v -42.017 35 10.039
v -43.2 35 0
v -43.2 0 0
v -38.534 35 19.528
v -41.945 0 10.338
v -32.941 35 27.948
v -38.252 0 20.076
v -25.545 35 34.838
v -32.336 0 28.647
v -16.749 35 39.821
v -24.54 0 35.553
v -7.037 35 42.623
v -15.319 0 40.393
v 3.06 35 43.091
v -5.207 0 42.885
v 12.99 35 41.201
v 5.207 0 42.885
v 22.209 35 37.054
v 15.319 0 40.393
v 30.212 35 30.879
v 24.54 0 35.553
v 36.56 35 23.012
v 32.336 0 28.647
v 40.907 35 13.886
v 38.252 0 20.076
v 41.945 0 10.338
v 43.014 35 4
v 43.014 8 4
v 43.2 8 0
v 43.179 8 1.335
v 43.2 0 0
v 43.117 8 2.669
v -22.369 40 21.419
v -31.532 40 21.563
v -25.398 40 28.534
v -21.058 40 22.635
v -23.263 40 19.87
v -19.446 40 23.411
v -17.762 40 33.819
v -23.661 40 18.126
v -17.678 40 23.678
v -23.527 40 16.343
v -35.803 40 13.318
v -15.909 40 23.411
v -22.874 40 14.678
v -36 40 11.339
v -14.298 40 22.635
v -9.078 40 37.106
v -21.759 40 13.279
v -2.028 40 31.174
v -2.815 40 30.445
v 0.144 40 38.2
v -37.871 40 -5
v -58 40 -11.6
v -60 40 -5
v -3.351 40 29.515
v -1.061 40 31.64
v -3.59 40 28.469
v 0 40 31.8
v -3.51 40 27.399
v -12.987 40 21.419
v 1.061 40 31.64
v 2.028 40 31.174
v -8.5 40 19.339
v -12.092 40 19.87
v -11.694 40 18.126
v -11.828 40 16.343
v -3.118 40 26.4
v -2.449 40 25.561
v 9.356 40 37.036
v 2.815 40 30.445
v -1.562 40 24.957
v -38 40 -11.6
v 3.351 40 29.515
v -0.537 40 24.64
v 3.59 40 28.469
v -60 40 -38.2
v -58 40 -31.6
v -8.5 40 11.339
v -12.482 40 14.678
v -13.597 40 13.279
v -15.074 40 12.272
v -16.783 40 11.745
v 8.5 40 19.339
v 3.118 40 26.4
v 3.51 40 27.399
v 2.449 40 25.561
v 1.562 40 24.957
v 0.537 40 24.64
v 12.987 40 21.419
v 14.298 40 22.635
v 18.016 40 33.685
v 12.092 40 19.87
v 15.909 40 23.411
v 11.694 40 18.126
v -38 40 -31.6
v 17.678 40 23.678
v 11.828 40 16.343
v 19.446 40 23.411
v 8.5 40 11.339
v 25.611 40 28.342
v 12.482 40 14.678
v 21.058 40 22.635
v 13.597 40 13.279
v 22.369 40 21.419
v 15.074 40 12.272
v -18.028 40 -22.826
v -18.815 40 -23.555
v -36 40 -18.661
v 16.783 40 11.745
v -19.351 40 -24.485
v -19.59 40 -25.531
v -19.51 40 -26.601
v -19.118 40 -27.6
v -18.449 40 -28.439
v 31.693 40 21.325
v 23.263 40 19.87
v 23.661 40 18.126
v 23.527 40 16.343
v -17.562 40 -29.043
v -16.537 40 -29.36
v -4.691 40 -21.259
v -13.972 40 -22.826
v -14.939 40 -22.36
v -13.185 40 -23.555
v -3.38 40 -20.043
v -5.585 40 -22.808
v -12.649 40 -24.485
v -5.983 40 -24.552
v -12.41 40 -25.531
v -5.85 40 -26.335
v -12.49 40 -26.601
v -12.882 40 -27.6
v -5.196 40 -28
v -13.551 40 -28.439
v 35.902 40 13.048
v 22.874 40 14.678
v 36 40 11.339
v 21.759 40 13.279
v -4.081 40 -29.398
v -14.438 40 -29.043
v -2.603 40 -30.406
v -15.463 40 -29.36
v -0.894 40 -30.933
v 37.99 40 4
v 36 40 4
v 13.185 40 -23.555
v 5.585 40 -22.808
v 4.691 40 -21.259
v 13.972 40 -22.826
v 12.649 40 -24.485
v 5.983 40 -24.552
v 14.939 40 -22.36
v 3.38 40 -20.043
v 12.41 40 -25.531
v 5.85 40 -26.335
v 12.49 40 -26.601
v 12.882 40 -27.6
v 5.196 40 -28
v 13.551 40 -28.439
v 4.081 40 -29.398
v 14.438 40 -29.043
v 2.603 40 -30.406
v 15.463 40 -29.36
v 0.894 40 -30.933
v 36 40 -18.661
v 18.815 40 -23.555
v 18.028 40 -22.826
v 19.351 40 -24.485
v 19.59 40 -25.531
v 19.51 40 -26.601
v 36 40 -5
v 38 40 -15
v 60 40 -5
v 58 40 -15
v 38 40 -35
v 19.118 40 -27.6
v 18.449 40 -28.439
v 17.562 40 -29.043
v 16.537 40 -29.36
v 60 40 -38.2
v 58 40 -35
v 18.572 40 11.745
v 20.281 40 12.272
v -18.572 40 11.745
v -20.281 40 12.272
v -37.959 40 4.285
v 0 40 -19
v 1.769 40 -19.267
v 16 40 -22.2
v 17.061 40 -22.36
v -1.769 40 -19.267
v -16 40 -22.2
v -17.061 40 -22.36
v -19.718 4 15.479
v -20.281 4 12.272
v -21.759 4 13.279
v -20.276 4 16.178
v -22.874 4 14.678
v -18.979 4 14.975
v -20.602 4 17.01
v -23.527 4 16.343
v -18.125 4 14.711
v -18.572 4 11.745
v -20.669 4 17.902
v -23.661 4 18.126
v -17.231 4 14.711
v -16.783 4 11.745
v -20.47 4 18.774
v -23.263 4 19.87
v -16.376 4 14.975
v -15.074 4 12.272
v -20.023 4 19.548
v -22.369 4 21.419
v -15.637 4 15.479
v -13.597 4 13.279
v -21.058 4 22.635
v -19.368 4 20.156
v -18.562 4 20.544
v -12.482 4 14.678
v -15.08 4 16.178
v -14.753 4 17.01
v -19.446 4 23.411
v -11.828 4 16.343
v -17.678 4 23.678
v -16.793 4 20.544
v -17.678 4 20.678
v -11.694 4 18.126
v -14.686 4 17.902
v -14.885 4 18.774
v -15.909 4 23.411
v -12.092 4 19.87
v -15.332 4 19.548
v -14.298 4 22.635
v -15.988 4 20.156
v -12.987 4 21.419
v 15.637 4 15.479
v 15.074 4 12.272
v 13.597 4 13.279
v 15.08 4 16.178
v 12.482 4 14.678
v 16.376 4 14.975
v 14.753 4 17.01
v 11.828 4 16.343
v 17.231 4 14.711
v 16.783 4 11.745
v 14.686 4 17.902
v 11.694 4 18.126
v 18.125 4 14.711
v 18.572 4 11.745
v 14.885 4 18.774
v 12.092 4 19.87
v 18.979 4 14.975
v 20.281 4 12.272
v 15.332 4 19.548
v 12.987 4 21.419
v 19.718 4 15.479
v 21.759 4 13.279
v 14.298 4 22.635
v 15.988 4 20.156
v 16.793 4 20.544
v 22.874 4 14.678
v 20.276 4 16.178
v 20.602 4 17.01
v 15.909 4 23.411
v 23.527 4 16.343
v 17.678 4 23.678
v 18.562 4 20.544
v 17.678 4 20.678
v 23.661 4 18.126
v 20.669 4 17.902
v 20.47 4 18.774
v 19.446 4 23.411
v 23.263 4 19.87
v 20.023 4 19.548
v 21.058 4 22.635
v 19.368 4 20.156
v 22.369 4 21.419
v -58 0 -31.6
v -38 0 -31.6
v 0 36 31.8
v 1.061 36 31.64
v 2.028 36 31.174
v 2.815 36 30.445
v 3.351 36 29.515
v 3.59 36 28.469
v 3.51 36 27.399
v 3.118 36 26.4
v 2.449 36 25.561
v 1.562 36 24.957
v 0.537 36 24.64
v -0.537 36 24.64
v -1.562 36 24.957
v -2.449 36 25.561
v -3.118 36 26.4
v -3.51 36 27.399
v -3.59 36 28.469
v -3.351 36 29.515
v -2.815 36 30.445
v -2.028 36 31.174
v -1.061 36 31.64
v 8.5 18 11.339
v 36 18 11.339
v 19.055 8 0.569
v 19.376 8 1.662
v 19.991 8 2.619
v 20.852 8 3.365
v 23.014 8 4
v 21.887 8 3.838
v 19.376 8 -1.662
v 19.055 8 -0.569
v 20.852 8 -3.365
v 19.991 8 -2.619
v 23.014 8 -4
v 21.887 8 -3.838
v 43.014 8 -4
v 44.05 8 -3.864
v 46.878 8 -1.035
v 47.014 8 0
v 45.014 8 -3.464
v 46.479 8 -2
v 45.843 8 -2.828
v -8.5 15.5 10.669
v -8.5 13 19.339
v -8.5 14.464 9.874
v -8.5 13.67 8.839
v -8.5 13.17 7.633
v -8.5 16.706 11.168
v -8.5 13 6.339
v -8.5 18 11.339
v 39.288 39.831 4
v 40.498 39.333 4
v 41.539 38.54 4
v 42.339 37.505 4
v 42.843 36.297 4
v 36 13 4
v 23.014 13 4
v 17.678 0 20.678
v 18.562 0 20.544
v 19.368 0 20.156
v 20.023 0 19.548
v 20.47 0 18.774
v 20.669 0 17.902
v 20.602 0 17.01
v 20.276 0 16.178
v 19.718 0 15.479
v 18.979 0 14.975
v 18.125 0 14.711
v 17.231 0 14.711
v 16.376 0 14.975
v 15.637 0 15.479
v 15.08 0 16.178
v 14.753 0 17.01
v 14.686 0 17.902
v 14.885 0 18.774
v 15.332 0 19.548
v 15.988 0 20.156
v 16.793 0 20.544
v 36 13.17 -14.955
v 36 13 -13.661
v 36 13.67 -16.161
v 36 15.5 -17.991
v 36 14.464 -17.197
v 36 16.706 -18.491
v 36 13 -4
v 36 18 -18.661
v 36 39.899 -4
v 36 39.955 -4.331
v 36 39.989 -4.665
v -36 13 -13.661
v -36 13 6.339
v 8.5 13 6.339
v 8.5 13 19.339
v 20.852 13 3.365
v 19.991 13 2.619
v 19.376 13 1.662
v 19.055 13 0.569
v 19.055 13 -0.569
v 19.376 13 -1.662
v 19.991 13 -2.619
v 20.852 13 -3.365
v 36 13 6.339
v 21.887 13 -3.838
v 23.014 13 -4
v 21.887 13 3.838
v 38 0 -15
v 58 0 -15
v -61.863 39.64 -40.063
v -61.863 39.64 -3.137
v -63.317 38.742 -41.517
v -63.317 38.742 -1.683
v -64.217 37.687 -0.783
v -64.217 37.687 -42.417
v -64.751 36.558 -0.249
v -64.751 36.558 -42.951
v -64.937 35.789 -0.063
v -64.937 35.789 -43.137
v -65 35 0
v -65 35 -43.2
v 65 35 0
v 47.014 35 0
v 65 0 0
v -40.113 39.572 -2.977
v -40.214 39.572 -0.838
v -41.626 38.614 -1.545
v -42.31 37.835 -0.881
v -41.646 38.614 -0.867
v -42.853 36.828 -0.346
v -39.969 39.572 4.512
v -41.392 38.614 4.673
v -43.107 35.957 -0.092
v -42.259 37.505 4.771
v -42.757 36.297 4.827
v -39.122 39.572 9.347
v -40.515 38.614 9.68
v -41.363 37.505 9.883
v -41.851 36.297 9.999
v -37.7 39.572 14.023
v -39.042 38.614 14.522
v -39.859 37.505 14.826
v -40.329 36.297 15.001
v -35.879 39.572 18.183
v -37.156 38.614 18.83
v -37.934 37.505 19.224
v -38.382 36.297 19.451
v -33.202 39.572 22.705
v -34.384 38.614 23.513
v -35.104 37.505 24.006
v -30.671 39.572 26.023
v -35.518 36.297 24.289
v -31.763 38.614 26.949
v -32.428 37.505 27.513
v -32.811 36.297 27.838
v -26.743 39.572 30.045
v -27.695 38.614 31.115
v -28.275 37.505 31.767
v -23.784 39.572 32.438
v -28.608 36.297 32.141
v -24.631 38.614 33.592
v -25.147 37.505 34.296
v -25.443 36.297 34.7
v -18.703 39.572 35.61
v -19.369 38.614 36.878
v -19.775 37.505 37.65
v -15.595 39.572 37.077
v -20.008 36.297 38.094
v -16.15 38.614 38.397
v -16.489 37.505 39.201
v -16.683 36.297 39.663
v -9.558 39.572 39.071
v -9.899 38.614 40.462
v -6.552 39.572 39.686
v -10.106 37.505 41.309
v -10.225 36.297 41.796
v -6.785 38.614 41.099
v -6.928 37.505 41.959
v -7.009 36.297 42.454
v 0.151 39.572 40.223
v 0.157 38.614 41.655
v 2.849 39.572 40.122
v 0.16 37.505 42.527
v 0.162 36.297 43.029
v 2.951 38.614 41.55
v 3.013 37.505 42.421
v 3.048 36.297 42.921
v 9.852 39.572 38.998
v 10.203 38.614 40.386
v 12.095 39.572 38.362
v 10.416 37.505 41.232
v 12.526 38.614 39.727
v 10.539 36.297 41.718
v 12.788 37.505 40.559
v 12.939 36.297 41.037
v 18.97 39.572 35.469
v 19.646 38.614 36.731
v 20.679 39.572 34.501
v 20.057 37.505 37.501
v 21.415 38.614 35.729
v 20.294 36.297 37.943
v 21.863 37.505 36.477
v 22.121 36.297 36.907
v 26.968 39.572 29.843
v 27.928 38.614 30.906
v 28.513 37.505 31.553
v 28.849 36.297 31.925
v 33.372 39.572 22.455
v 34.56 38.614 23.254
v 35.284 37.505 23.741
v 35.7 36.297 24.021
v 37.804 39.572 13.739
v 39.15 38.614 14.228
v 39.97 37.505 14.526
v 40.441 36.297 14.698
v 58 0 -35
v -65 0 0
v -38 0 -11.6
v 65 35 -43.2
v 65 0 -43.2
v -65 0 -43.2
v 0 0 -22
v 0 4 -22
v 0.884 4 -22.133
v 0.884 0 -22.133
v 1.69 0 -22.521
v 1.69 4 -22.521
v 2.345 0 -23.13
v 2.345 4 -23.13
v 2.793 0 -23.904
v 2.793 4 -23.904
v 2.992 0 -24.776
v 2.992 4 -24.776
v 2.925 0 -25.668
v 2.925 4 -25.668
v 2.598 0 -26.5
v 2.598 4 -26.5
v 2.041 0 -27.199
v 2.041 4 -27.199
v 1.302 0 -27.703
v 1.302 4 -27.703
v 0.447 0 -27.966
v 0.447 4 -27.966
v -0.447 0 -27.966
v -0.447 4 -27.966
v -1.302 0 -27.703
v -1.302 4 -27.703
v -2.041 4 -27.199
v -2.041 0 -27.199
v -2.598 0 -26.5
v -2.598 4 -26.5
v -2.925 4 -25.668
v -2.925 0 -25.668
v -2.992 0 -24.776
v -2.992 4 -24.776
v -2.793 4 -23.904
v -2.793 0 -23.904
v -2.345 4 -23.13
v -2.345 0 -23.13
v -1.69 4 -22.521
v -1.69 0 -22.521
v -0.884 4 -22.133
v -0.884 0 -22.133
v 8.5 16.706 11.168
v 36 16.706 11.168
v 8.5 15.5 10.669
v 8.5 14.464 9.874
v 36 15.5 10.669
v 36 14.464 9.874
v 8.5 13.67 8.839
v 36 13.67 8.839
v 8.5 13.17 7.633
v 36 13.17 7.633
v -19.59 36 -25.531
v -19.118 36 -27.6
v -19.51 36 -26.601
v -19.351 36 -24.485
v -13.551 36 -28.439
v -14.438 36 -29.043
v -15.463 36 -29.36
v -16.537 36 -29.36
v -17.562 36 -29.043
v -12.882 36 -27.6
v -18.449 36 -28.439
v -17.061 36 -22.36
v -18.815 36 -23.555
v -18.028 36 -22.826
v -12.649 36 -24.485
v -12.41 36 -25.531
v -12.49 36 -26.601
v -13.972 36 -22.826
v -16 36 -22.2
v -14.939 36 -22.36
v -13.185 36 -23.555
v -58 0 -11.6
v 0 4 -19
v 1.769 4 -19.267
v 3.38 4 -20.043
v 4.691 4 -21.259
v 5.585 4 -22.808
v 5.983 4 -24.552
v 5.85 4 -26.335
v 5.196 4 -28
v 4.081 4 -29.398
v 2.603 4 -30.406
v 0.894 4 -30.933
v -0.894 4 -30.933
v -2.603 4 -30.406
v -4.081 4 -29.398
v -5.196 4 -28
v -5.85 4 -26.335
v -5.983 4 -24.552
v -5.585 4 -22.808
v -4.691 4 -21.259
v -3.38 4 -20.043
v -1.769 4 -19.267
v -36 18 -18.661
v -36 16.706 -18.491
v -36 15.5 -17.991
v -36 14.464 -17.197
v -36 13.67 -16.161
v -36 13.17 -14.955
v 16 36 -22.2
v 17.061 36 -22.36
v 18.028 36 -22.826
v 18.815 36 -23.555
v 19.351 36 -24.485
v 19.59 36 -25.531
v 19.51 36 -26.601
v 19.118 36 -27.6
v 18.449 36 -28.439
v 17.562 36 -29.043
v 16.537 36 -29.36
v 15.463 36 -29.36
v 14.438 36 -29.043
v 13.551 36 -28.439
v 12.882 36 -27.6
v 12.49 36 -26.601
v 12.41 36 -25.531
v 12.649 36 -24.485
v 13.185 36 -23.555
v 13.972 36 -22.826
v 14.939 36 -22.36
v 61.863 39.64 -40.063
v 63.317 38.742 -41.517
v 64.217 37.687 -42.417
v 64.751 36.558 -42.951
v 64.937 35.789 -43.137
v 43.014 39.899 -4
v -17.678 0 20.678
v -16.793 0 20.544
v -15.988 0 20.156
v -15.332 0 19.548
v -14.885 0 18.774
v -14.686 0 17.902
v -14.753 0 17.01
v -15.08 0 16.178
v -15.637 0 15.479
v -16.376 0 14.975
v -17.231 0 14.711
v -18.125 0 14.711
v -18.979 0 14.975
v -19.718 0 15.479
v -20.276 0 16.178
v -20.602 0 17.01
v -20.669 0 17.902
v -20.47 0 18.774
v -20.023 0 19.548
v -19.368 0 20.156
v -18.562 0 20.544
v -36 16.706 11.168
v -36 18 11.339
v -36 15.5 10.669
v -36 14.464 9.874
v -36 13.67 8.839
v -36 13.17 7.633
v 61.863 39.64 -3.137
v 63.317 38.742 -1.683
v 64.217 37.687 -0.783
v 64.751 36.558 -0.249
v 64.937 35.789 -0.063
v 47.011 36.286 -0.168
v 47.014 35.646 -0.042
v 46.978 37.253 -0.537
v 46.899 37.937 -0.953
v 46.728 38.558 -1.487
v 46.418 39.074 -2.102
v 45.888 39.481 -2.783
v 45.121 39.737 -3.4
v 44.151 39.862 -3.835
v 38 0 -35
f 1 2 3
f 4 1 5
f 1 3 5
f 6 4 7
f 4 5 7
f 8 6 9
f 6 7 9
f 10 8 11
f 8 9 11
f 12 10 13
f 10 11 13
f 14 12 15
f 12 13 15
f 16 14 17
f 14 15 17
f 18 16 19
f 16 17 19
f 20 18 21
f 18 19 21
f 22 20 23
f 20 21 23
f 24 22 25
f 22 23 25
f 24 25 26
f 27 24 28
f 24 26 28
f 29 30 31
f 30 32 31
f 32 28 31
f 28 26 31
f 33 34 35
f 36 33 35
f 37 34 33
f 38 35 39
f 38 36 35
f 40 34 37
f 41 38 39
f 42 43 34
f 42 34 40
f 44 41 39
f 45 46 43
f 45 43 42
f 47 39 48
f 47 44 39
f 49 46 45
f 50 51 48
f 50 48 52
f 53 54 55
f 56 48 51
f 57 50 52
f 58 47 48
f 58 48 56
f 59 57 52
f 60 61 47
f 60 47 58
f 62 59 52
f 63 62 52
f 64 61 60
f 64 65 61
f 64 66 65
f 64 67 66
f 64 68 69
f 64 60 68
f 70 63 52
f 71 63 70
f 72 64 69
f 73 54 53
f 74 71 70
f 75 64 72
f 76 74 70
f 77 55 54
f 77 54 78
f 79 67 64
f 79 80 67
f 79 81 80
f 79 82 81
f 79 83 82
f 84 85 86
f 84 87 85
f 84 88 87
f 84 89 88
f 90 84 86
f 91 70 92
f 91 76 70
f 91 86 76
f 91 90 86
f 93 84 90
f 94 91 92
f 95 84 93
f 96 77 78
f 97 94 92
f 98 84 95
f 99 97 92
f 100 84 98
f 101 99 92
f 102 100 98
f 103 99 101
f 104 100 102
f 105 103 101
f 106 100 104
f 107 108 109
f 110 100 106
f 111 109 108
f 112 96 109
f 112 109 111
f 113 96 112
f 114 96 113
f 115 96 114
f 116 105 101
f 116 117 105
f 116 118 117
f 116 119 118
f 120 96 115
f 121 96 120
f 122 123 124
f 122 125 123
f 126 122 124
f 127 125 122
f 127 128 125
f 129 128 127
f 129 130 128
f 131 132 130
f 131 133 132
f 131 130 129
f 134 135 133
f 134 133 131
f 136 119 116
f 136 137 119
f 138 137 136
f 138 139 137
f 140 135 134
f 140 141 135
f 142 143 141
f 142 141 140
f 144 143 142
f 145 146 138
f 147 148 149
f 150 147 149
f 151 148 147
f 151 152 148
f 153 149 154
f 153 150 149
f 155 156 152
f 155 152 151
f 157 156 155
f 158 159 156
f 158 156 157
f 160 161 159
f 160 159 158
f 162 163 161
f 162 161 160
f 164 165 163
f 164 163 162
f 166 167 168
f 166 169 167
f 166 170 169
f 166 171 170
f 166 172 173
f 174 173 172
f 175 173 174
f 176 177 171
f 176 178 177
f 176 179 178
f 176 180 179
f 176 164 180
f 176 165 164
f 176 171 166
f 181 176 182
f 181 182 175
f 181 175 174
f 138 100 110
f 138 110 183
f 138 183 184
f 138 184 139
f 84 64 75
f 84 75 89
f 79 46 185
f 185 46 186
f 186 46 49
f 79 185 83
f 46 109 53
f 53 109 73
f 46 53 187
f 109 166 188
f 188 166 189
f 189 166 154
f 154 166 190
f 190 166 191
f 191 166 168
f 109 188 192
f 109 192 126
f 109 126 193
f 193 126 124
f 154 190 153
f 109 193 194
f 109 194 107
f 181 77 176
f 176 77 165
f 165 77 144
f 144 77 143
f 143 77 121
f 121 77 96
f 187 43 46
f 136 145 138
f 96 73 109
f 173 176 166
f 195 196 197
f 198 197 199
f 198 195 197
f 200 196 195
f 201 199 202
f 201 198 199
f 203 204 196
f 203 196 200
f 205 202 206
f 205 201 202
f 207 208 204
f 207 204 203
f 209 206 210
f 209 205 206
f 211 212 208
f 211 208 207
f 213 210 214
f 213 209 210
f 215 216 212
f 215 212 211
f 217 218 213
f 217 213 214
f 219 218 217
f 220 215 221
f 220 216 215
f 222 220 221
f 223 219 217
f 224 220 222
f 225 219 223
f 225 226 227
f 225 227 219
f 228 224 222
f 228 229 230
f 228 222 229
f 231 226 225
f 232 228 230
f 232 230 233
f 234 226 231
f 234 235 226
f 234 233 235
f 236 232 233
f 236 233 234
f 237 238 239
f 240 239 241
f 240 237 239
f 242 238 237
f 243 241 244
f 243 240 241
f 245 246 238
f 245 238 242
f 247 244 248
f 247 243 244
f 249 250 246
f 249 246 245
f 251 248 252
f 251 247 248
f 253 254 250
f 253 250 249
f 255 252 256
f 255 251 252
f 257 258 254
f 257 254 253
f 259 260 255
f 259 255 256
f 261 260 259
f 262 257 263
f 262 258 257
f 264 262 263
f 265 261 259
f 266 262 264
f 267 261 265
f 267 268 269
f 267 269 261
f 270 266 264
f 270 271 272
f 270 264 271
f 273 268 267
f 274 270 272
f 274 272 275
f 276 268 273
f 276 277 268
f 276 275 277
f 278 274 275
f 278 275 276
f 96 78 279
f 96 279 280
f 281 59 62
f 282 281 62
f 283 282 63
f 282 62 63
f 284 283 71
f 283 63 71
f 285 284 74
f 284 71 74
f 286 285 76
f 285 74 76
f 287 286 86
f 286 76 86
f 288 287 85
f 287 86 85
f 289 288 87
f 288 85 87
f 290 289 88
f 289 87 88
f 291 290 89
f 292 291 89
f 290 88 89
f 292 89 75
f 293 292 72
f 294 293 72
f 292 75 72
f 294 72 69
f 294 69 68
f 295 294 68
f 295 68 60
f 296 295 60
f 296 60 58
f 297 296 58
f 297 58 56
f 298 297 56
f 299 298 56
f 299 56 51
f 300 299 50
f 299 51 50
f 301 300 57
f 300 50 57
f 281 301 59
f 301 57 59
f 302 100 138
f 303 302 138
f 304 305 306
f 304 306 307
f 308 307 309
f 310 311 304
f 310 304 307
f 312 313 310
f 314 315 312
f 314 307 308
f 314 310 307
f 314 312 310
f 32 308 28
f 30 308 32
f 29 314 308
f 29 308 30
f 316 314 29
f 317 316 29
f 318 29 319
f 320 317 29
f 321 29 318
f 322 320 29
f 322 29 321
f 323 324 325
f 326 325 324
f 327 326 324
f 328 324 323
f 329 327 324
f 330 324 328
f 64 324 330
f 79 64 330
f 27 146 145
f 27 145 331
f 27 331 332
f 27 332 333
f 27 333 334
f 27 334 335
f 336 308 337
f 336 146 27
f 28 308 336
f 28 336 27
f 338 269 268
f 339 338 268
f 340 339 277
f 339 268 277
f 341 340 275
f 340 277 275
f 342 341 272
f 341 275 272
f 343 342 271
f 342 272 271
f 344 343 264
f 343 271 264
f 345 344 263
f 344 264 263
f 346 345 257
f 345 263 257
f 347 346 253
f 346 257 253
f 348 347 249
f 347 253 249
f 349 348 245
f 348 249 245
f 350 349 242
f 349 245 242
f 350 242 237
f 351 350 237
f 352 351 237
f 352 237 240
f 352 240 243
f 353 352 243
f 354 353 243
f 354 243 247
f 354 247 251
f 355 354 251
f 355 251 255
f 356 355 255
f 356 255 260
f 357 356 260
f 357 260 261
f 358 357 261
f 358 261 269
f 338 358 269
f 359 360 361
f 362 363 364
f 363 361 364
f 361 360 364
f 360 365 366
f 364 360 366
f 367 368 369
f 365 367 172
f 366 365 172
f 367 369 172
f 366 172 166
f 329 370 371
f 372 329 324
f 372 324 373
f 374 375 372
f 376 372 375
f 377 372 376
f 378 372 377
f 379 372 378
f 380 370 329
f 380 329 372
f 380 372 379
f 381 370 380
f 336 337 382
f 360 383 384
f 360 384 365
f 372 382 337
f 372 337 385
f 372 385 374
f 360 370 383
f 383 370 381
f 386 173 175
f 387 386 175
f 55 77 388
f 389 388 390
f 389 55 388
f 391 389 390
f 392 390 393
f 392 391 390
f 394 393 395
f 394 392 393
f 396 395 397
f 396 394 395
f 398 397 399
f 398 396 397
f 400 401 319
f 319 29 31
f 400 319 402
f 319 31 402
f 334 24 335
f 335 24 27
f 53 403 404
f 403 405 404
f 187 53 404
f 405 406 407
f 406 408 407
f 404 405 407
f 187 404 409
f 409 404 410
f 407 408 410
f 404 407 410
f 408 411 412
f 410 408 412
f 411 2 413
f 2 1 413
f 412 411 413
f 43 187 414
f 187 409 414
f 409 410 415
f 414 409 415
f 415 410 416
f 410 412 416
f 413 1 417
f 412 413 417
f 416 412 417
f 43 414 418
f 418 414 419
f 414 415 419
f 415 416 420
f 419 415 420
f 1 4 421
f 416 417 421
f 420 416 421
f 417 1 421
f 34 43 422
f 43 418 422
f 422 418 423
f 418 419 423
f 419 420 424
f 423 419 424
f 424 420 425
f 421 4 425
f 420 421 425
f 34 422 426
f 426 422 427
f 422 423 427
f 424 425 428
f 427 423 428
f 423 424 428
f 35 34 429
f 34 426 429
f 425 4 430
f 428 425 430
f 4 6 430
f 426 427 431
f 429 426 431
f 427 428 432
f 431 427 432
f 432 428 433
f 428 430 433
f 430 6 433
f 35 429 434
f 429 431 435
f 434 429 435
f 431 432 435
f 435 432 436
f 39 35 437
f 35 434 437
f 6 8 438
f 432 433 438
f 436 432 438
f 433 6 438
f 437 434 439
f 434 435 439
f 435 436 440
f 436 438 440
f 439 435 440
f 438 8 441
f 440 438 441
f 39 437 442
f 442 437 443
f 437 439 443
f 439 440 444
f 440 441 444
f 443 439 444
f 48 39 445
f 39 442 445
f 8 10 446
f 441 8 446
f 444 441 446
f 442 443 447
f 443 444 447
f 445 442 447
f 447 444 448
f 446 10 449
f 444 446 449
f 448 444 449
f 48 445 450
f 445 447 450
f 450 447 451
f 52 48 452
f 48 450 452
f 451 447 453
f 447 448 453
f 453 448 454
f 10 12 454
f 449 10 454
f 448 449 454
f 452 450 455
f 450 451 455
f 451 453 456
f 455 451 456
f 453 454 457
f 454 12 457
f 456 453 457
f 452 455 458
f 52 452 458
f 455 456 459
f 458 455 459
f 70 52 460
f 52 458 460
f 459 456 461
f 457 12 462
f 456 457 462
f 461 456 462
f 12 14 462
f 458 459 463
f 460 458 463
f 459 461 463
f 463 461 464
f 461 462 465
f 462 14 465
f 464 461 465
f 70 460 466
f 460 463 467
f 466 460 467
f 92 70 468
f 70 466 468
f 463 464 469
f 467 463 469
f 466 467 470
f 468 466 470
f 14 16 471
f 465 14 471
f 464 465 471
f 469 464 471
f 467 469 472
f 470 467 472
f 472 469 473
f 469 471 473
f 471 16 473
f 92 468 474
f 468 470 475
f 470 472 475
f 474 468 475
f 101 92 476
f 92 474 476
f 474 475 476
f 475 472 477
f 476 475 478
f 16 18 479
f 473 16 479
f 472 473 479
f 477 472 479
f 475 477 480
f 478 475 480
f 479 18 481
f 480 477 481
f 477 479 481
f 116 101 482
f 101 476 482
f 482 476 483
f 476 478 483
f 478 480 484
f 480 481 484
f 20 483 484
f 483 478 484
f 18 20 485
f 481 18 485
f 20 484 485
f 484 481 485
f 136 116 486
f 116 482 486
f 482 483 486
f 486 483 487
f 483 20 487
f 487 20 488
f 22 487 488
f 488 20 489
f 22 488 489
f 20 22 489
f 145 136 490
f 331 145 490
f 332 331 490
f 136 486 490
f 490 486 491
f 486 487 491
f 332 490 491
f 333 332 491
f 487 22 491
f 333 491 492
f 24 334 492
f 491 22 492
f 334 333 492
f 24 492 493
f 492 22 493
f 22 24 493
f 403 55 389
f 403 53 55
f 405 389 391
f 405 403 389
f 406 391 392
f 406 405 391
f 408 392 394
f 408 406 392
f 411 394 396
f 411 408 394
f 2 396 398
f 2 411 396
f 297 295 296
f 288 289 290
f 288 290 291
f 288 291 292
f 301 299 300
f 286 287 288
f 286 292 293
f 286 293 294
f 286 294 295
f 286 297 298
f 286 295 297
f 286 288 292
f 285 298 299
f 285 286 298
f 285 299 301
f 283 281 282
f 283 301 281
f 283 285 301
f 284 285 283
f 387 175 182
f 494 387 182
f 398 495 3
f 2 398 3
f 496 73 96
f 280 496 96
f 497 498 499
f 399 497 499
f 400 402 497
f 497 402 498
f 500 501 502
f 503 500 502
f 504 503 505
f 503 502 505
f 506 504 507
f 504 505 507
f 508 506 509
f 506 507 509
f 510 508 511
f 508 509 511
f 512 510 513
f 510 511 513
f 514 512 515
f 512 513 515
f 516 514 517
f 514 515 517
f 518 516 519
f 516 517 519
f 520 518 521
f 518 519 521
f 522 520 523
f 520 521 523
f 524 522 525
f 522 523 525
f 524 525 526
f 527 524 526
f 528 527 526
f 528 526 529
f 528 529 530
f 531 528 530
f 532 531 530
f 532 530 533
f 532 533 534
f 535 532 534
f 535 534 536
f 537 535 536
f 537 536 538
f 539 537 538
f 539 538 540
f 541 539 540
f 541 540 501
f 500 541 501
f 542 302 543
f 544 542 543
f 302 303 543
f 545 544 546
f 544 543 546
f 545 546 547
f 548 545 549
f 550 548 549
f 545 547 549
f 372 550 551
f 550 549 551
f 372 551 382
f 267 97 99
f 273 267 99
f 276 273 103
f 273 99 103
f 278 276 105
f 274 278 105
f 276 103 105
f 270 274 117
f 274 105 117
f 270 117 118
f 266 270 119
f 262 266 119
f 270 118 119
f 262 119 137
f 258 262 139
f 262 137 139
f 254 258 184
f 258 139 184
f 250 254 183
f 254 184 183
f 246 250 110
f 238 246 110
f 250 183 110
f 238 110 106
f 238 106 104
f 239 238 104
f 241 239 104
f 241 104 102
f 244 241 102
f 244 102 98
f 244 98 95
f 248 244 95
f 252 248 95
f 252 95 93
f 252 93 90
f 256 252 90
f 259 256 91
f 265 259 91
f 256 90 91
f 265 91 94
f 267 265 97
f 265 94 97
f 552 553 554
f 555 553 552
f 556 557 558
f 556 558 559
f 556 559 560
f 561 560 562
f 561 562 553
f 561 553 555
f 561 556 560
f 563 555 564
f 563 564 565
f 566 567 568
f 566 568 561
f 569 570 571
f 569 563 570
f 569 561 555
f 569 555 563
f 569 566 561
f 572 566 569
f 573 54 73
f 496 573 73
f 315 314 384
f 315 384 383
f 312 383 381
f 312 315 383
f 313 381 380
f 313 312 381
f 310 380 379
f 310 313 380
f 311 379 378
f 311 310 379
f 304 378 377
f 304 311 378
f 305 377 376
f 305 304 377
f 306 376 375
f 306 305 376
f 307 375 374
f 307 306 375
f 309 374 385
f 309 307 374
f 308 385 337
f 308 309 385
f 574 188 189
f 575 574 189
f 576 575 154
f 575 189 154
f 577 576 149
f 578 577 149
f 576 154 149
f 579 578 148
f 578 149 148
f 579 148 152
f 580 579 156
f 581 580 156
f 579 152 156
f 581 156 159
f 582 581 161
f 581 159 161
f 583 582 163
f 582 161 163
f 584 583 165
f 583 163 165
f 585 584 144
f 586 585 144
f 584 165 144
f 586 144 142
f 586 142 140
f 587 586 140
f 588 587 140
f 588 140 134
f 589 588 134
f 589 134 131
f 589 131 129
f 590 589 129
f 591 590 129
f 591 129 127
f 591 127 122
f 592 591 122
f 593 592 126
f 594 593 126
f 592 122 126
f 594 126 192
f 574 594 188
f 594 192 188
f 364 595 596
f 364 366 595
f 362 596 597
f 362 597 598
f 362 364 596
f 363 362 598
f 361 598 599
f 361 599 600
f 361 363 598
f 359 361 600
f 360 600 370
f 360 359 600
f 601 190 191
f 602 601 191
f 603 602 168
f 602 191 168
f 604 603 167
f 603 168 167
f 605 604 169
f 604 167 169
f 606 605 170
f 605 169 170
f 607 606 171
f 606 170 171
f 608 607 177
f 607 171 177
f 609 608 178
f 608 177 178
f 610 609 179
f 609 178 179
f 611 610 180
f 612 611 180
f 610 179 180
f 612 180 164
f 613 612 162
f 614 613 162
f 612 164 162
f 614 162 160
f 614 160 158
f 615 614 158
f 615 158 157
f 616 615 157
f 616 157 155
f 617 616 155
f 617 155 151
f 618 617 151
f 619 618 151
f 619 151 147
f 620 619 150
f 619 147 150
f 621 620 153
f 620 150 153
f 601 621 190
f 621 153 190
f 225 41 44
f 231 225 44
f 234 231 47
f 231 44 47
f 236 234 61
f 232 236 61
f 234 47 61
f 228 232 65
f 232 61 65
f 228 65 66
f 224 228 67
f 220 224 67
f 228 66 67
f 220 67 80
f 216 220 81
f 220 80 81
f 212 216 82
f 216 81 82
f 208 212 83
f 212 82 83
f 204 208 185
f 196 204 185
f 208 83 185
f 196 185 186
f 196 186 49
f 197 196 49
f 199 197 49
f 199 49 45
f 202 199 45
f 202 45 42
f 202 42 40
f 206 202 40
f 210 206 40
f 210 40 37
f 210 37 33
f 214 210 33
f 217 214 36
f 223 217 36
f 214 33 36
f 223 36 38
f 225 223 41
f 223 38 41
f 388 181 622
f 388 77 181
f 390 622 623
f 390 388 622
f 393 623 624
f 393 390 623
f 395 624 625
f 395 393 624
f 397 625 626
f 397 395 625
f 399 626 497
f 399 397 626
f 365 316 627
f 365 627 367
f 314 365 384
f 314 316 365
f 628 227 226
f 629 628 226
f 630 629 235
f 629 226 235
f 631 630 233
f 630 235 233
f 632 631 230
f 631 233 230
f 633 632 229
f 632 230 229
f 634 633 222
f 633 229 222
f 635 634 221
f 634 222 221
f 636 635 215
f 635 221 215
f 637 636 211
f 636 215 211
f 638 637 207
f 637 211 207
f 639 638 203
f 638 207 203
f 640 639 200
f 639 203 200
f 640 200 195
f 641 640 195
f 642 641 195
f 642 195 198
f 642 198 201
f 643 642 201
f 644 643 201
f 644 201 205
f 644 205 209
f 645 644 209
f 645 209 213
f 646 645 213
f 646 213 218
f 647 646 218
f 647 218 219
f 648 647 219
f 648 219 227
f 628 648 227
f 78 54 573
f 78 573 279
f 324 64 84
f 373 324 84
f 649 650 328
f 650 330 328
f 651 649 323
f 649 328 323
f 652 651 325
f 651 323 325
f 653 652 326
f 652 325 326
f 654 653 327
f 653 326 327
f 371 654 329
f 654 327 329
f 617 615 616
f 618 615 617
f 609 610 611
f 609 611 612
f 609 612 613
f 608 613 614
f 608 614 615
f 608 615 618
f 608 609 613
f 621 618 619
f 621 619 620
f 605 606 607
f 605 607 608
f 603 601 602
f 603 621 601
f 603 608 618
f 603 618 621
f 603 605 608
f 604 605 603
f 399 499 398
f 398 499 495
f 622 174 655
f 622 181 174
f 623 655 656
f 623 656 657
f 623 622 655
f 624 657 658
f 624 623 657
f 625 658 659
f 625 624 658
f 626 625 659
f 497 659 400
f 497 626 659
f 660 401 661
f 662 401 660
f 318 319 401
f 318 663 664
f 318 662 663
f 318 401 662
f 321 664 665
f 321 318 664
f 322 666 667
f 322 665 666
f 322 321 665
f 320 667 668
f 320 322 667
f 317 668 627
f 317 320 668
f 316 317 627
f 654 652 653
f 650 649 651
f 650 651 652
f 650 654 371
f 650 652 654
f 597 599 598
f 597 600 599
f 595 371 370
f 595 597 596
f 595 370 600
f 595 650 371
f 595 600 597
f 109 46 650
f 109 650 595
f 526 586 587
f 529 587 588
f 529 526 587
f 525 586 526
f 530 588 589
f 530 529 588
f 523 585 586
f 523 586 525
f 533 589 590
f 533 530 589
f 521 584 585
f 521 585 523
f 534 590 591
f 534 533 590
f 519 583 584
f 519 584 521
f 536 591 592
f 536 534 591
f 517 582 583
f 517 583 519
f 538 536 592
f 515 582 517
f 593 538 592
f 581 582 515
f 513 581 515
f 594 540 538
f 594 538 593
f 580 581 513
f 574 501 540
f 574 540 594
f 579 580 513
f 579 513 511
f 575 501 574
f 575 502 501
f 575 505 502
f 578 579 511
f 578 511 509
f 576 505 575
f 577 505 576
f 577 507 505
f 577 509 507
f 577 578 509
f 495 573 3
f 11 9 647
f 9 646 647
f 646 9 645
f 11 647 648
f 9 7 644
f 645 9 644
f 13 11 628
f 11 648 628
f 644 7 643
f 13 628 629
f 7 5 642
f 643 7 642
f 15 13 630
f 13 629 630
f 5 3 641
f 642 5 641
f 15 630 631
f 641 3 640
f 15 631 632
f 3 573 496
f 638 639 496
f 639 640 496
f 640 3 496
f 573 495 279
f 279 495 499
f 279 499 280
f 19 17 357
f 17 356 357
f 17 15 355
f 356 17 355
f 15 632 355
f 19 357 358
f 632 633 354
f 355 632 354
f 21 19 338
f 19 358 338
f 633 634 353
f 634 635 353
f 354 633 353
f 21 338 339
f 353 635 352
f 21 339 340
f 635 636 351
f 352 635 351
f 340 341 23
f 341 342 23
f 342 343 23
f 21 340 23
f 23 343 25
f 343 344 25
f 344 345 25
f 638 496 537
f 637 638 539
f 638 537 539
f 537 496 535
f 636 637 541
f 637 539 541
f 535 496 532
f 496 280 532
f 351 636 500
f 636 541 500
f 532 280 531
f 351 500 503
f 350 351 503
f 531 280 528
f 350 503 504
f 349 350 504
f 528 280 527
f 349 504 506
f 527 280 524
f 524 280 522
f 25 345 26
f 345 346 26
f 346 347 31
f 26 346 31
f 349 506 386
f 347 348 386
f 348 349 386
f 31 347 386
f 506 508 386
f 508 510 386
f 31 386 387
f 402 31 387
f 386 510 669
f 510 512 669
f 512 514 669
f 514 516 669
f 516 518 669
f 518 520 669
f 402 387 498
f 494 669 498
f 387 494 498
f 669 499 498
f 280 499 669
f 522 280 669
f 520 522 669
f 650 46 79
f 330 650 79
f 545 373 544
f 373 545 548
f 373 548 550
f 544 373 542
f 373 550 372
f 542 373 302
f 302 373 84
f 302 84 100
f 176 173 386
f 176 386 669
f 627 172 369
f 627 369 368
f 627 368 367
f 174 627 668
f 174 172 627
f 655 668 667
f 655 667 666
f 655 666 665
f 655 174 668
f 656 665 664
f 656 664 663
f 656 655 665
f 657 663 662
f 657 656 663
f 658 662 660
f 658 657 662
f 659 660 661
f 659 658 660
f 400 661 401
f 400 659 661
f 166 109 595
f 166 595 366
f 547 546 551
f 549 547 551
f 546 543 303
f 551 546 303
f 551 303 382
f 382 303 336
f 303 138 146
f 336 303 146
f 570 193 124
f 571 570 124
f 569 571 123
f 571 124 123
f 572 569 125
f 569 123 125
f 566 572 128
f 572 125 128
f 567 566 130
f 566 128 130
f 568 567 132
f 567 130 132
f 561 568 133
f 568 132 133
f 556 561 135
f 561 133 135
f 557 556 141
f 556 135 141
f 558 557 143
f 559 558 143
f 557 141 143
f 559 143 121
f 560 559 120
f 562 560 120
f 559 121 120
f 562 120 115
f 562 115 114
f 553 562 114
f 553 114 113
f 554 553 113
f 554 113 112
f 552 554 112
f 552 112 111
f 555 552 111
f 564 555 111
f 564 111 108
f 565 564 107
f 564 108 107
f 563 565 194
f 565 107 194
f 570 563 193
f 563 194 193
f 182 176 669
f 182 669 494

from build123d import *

# Parameters (mm, degrees)
SKETCH1_R           = 43.2
BOSS_EXTRUDE1_DEPTH = 40
SKETCH2_R           = 3
SKETCH2_W           = 20
SKETCH2_H           = 20
CUT_EXTRUDE1_DEPTH  = 50
SKETCH3_W           = 8.5
SKETCH3_H           = 8
SKETCH3_W_2         = 72
SKETCH3_H_2         = 30
CUT_EXTRUDE2_DEPTH  = 27
FILLET1_R           = 5
CUT_EXTRUDE3_START  = -32
SKETCH4_R           = 4
CUT_EXTRUDE3_DEPTH  = 32
SKETCH5_R           = 3.6
CUT_EXTRUDE4_DEPTH  = 4
FILLET3_R           = 5
SKETCH7_R           = 6
CUT_EXTRUDE5_DEPTH  = 36


with BuildPart() as part:
    # Sketch1 → Boss-Extrude1 (new body)
    with BuildSketch(Plane(origin=(0, 0, 0), x_dir=(1, 0, 0), z_dir=(0, 1, 0))):
        Circle(SKETCH1_R)
        with BuildLine():
            Line((0, 43.2), (-65, 43.2))
            Line((-65, 43.2), (-65, 0))
            Line((-65, 0), (-43.2, 0))
            ThreePointArc((-43.2, 0), (-30.547012947, 30.547012947), (0, 43.2))
        make_face()
        with BuildLine():
            Line((65, 43.2), (0, 43.2))
            ThreePointArc((0, 43.2), (30.547012947, 30.547012947), (43.2, 0))
            Line((43.2, 0), (65, 0))
            Line((65, 0), (65, 43.2))
        make_face()
    extrude(amount=BOSS_EXTRUDE1_DEPTH)

    # Sketch2 → Cut-Extrude1 (cut)
    with BuildSketch(Plane(origin=(0, 40, 0), x_dir=(1, 0, 0), z_dir=(0, 1, 0))):
        with Locations(Location((0, 25, 0), (0, 0, 270))):
            Circle(SKETCH2_R)
        with Locations(Location((17.67766953, -17.67766953, 0), (0, 0, 270))):
            Circle(SKETCH2_R)
        with Locations(Location((-17.67766953, -17.67766953, 0), (0, 0, 270))):
            Circle(SKETCH2_R)
        with Locations((48, 25)):
            Rectangle(SKETCH2_W, SKETCH2_H)
        with Locations((-48, 21.6)):
            Rectangle(SKETCH2_W, SKETCH2_H)
    extrude(amount=-CUT_EXTRUDE1_DEPTH, mode=Mode.SUBTRACT)

    # Sketch3 → Cut-Extrude2 (cut)
    with BuildSketch(Plane(origin=(0, 40, 0), x_dir=(1, 0, 0), z_dir=(0, 1, 0))):
        with Locations((4.25, -15.338834765)):
            Rectangle(SKETCH3_W, SKETCH3_H)
        with Locations((-4.25, -15.338834765)):
            Rectangle(SKETCH3_W, SKETCH3_H)
        with Locations((0, 3.661165235)):
            Rectangle(SKETCH3_W_2, SKETCH3_H_2)
    extrude(amount=-CUT_EXTRUDE2_DEPTH, mode=Mode.SUBTRACT)

    # Fillet1
    fillet1_edges = [part.edges().sort_by_distance(p)[0] for p in [
        (-22.25, 13, 11.338834765),
        (22.25, 13, 11.338834765),
        (0, 13, -18.661165235),
    ]]
    fillet(fillet1_edges, radius=FILLET1_R)

    # Sketch4 → Cut-Extrude3 (cut)
    with BuildSketch(Plane(origin=(0, 40, 0), x_dir=(1, 0, 0), z_dir=(0, 1, 0)).offset(CUT_EXTRUDE3_START)):
        with BuildLine():
            Line((43.014416188, 4), (36, 4))
            Line((36, 4), (36, -4))
            Line((36, -4), (43.014416188, -4))
            ThreePointArc((43.014416188, -4), (43.153579106, -2.002151427), (43.2, 0))
            Line((43.2, 0), (47.014416188, 0))
            ThreePointArc((47.014416188, 0), (45.842843313, 2.828427125), (43.014416188, 4))
        make_face()
        with BuildLine():
            Line((36, 4), (23.014416188, 4))
            ThreePointArc((23.014416188, 4), (25.842843313, 2.828427125), (27.014416188, 0))
            ThreePointArc((27.014416188, 0), (25.842843313, -2.828427125), (23.014416188, -4))
            Line((23.014416188, -4), (36, -4))
            Line((36, -4), (36, 4))
        make_face()
        with Locations((23.014416188, 0)):
            Circle(SKETCH4_R)
        with BuildLine():
            ThreePointArc((43.014416188, -4), (45.842843313, -2.828427125), (47.014416188, 0))
            Line((47.014416188, 0), (43.2, 0))
            ThreePointArc((43.2, 0), (43.153579106, -2.002151427), (43.014416188, -4))
        make_face()
    extrude(amount=CUT_EXTRUDE3_DEPTH, mode=Mode.SUBTRACT)

    # Sketch5 → Cut-Extrude4 (cut)
    with BuildSketch(Plane(origin=(0, 40, 0), x_dir=(1, 0, 0), z_dir=(0, 1, 0))):
        with Locations(Location((16, 25.8, 0), (0, 0, 270))):
            Circle(SKETCH5_R)
        with Locations(Location((-16, 25.8, 0), (0, 0, 270))):
            Circle(SKETCH5_R)
        with Locations(Location((0, -28.2, 0), (0, 0, 270))):
            Circle(SKETCH5_R)
    extrude(amount=-CUT_EXTRUDE4_DEPTH, mode=Mode.SUBTRACT)

    # Fillet3
    fillet3_edges = [part.edges().sort_by_distance(p)[0] for p in [
        (-2.002151427, 40, 43.153579106),
        (56.007208094, 40, 0),
        (-54.1, 40, 0),
        (-65, 40, -21.6),
        (65, 40, -21.6),
        (0, 40, -43.2),
    ]]
    fillet(fillet3_edges, radius=FILLET3_R)

    # Sketch7 → Cut-Extrude5 (cut)
    with BuildSketch(Plane(origin=(0, 40, 0), x_dir=(1, 0, 0), z_dir=(0, 1, 0))):
        with Locations(Location((0, 25, 0), (0, 0, 270))):
            Circle(SKETCH7_R)
        with Locations(Location((17.67766953, -17.67766953, 0), (0, 0, 270))):
            Circle(SKETCH7_R)
        with Locations(Location((-17.67766953, -17.67766953, 0), (0, 0, 270))):
            Circle(SKETCH7_R)
    extrude(amount=-CUT_EXTRUDE5_DEPTH, mode=Mode.SUBTRACT)


solid = part.part
